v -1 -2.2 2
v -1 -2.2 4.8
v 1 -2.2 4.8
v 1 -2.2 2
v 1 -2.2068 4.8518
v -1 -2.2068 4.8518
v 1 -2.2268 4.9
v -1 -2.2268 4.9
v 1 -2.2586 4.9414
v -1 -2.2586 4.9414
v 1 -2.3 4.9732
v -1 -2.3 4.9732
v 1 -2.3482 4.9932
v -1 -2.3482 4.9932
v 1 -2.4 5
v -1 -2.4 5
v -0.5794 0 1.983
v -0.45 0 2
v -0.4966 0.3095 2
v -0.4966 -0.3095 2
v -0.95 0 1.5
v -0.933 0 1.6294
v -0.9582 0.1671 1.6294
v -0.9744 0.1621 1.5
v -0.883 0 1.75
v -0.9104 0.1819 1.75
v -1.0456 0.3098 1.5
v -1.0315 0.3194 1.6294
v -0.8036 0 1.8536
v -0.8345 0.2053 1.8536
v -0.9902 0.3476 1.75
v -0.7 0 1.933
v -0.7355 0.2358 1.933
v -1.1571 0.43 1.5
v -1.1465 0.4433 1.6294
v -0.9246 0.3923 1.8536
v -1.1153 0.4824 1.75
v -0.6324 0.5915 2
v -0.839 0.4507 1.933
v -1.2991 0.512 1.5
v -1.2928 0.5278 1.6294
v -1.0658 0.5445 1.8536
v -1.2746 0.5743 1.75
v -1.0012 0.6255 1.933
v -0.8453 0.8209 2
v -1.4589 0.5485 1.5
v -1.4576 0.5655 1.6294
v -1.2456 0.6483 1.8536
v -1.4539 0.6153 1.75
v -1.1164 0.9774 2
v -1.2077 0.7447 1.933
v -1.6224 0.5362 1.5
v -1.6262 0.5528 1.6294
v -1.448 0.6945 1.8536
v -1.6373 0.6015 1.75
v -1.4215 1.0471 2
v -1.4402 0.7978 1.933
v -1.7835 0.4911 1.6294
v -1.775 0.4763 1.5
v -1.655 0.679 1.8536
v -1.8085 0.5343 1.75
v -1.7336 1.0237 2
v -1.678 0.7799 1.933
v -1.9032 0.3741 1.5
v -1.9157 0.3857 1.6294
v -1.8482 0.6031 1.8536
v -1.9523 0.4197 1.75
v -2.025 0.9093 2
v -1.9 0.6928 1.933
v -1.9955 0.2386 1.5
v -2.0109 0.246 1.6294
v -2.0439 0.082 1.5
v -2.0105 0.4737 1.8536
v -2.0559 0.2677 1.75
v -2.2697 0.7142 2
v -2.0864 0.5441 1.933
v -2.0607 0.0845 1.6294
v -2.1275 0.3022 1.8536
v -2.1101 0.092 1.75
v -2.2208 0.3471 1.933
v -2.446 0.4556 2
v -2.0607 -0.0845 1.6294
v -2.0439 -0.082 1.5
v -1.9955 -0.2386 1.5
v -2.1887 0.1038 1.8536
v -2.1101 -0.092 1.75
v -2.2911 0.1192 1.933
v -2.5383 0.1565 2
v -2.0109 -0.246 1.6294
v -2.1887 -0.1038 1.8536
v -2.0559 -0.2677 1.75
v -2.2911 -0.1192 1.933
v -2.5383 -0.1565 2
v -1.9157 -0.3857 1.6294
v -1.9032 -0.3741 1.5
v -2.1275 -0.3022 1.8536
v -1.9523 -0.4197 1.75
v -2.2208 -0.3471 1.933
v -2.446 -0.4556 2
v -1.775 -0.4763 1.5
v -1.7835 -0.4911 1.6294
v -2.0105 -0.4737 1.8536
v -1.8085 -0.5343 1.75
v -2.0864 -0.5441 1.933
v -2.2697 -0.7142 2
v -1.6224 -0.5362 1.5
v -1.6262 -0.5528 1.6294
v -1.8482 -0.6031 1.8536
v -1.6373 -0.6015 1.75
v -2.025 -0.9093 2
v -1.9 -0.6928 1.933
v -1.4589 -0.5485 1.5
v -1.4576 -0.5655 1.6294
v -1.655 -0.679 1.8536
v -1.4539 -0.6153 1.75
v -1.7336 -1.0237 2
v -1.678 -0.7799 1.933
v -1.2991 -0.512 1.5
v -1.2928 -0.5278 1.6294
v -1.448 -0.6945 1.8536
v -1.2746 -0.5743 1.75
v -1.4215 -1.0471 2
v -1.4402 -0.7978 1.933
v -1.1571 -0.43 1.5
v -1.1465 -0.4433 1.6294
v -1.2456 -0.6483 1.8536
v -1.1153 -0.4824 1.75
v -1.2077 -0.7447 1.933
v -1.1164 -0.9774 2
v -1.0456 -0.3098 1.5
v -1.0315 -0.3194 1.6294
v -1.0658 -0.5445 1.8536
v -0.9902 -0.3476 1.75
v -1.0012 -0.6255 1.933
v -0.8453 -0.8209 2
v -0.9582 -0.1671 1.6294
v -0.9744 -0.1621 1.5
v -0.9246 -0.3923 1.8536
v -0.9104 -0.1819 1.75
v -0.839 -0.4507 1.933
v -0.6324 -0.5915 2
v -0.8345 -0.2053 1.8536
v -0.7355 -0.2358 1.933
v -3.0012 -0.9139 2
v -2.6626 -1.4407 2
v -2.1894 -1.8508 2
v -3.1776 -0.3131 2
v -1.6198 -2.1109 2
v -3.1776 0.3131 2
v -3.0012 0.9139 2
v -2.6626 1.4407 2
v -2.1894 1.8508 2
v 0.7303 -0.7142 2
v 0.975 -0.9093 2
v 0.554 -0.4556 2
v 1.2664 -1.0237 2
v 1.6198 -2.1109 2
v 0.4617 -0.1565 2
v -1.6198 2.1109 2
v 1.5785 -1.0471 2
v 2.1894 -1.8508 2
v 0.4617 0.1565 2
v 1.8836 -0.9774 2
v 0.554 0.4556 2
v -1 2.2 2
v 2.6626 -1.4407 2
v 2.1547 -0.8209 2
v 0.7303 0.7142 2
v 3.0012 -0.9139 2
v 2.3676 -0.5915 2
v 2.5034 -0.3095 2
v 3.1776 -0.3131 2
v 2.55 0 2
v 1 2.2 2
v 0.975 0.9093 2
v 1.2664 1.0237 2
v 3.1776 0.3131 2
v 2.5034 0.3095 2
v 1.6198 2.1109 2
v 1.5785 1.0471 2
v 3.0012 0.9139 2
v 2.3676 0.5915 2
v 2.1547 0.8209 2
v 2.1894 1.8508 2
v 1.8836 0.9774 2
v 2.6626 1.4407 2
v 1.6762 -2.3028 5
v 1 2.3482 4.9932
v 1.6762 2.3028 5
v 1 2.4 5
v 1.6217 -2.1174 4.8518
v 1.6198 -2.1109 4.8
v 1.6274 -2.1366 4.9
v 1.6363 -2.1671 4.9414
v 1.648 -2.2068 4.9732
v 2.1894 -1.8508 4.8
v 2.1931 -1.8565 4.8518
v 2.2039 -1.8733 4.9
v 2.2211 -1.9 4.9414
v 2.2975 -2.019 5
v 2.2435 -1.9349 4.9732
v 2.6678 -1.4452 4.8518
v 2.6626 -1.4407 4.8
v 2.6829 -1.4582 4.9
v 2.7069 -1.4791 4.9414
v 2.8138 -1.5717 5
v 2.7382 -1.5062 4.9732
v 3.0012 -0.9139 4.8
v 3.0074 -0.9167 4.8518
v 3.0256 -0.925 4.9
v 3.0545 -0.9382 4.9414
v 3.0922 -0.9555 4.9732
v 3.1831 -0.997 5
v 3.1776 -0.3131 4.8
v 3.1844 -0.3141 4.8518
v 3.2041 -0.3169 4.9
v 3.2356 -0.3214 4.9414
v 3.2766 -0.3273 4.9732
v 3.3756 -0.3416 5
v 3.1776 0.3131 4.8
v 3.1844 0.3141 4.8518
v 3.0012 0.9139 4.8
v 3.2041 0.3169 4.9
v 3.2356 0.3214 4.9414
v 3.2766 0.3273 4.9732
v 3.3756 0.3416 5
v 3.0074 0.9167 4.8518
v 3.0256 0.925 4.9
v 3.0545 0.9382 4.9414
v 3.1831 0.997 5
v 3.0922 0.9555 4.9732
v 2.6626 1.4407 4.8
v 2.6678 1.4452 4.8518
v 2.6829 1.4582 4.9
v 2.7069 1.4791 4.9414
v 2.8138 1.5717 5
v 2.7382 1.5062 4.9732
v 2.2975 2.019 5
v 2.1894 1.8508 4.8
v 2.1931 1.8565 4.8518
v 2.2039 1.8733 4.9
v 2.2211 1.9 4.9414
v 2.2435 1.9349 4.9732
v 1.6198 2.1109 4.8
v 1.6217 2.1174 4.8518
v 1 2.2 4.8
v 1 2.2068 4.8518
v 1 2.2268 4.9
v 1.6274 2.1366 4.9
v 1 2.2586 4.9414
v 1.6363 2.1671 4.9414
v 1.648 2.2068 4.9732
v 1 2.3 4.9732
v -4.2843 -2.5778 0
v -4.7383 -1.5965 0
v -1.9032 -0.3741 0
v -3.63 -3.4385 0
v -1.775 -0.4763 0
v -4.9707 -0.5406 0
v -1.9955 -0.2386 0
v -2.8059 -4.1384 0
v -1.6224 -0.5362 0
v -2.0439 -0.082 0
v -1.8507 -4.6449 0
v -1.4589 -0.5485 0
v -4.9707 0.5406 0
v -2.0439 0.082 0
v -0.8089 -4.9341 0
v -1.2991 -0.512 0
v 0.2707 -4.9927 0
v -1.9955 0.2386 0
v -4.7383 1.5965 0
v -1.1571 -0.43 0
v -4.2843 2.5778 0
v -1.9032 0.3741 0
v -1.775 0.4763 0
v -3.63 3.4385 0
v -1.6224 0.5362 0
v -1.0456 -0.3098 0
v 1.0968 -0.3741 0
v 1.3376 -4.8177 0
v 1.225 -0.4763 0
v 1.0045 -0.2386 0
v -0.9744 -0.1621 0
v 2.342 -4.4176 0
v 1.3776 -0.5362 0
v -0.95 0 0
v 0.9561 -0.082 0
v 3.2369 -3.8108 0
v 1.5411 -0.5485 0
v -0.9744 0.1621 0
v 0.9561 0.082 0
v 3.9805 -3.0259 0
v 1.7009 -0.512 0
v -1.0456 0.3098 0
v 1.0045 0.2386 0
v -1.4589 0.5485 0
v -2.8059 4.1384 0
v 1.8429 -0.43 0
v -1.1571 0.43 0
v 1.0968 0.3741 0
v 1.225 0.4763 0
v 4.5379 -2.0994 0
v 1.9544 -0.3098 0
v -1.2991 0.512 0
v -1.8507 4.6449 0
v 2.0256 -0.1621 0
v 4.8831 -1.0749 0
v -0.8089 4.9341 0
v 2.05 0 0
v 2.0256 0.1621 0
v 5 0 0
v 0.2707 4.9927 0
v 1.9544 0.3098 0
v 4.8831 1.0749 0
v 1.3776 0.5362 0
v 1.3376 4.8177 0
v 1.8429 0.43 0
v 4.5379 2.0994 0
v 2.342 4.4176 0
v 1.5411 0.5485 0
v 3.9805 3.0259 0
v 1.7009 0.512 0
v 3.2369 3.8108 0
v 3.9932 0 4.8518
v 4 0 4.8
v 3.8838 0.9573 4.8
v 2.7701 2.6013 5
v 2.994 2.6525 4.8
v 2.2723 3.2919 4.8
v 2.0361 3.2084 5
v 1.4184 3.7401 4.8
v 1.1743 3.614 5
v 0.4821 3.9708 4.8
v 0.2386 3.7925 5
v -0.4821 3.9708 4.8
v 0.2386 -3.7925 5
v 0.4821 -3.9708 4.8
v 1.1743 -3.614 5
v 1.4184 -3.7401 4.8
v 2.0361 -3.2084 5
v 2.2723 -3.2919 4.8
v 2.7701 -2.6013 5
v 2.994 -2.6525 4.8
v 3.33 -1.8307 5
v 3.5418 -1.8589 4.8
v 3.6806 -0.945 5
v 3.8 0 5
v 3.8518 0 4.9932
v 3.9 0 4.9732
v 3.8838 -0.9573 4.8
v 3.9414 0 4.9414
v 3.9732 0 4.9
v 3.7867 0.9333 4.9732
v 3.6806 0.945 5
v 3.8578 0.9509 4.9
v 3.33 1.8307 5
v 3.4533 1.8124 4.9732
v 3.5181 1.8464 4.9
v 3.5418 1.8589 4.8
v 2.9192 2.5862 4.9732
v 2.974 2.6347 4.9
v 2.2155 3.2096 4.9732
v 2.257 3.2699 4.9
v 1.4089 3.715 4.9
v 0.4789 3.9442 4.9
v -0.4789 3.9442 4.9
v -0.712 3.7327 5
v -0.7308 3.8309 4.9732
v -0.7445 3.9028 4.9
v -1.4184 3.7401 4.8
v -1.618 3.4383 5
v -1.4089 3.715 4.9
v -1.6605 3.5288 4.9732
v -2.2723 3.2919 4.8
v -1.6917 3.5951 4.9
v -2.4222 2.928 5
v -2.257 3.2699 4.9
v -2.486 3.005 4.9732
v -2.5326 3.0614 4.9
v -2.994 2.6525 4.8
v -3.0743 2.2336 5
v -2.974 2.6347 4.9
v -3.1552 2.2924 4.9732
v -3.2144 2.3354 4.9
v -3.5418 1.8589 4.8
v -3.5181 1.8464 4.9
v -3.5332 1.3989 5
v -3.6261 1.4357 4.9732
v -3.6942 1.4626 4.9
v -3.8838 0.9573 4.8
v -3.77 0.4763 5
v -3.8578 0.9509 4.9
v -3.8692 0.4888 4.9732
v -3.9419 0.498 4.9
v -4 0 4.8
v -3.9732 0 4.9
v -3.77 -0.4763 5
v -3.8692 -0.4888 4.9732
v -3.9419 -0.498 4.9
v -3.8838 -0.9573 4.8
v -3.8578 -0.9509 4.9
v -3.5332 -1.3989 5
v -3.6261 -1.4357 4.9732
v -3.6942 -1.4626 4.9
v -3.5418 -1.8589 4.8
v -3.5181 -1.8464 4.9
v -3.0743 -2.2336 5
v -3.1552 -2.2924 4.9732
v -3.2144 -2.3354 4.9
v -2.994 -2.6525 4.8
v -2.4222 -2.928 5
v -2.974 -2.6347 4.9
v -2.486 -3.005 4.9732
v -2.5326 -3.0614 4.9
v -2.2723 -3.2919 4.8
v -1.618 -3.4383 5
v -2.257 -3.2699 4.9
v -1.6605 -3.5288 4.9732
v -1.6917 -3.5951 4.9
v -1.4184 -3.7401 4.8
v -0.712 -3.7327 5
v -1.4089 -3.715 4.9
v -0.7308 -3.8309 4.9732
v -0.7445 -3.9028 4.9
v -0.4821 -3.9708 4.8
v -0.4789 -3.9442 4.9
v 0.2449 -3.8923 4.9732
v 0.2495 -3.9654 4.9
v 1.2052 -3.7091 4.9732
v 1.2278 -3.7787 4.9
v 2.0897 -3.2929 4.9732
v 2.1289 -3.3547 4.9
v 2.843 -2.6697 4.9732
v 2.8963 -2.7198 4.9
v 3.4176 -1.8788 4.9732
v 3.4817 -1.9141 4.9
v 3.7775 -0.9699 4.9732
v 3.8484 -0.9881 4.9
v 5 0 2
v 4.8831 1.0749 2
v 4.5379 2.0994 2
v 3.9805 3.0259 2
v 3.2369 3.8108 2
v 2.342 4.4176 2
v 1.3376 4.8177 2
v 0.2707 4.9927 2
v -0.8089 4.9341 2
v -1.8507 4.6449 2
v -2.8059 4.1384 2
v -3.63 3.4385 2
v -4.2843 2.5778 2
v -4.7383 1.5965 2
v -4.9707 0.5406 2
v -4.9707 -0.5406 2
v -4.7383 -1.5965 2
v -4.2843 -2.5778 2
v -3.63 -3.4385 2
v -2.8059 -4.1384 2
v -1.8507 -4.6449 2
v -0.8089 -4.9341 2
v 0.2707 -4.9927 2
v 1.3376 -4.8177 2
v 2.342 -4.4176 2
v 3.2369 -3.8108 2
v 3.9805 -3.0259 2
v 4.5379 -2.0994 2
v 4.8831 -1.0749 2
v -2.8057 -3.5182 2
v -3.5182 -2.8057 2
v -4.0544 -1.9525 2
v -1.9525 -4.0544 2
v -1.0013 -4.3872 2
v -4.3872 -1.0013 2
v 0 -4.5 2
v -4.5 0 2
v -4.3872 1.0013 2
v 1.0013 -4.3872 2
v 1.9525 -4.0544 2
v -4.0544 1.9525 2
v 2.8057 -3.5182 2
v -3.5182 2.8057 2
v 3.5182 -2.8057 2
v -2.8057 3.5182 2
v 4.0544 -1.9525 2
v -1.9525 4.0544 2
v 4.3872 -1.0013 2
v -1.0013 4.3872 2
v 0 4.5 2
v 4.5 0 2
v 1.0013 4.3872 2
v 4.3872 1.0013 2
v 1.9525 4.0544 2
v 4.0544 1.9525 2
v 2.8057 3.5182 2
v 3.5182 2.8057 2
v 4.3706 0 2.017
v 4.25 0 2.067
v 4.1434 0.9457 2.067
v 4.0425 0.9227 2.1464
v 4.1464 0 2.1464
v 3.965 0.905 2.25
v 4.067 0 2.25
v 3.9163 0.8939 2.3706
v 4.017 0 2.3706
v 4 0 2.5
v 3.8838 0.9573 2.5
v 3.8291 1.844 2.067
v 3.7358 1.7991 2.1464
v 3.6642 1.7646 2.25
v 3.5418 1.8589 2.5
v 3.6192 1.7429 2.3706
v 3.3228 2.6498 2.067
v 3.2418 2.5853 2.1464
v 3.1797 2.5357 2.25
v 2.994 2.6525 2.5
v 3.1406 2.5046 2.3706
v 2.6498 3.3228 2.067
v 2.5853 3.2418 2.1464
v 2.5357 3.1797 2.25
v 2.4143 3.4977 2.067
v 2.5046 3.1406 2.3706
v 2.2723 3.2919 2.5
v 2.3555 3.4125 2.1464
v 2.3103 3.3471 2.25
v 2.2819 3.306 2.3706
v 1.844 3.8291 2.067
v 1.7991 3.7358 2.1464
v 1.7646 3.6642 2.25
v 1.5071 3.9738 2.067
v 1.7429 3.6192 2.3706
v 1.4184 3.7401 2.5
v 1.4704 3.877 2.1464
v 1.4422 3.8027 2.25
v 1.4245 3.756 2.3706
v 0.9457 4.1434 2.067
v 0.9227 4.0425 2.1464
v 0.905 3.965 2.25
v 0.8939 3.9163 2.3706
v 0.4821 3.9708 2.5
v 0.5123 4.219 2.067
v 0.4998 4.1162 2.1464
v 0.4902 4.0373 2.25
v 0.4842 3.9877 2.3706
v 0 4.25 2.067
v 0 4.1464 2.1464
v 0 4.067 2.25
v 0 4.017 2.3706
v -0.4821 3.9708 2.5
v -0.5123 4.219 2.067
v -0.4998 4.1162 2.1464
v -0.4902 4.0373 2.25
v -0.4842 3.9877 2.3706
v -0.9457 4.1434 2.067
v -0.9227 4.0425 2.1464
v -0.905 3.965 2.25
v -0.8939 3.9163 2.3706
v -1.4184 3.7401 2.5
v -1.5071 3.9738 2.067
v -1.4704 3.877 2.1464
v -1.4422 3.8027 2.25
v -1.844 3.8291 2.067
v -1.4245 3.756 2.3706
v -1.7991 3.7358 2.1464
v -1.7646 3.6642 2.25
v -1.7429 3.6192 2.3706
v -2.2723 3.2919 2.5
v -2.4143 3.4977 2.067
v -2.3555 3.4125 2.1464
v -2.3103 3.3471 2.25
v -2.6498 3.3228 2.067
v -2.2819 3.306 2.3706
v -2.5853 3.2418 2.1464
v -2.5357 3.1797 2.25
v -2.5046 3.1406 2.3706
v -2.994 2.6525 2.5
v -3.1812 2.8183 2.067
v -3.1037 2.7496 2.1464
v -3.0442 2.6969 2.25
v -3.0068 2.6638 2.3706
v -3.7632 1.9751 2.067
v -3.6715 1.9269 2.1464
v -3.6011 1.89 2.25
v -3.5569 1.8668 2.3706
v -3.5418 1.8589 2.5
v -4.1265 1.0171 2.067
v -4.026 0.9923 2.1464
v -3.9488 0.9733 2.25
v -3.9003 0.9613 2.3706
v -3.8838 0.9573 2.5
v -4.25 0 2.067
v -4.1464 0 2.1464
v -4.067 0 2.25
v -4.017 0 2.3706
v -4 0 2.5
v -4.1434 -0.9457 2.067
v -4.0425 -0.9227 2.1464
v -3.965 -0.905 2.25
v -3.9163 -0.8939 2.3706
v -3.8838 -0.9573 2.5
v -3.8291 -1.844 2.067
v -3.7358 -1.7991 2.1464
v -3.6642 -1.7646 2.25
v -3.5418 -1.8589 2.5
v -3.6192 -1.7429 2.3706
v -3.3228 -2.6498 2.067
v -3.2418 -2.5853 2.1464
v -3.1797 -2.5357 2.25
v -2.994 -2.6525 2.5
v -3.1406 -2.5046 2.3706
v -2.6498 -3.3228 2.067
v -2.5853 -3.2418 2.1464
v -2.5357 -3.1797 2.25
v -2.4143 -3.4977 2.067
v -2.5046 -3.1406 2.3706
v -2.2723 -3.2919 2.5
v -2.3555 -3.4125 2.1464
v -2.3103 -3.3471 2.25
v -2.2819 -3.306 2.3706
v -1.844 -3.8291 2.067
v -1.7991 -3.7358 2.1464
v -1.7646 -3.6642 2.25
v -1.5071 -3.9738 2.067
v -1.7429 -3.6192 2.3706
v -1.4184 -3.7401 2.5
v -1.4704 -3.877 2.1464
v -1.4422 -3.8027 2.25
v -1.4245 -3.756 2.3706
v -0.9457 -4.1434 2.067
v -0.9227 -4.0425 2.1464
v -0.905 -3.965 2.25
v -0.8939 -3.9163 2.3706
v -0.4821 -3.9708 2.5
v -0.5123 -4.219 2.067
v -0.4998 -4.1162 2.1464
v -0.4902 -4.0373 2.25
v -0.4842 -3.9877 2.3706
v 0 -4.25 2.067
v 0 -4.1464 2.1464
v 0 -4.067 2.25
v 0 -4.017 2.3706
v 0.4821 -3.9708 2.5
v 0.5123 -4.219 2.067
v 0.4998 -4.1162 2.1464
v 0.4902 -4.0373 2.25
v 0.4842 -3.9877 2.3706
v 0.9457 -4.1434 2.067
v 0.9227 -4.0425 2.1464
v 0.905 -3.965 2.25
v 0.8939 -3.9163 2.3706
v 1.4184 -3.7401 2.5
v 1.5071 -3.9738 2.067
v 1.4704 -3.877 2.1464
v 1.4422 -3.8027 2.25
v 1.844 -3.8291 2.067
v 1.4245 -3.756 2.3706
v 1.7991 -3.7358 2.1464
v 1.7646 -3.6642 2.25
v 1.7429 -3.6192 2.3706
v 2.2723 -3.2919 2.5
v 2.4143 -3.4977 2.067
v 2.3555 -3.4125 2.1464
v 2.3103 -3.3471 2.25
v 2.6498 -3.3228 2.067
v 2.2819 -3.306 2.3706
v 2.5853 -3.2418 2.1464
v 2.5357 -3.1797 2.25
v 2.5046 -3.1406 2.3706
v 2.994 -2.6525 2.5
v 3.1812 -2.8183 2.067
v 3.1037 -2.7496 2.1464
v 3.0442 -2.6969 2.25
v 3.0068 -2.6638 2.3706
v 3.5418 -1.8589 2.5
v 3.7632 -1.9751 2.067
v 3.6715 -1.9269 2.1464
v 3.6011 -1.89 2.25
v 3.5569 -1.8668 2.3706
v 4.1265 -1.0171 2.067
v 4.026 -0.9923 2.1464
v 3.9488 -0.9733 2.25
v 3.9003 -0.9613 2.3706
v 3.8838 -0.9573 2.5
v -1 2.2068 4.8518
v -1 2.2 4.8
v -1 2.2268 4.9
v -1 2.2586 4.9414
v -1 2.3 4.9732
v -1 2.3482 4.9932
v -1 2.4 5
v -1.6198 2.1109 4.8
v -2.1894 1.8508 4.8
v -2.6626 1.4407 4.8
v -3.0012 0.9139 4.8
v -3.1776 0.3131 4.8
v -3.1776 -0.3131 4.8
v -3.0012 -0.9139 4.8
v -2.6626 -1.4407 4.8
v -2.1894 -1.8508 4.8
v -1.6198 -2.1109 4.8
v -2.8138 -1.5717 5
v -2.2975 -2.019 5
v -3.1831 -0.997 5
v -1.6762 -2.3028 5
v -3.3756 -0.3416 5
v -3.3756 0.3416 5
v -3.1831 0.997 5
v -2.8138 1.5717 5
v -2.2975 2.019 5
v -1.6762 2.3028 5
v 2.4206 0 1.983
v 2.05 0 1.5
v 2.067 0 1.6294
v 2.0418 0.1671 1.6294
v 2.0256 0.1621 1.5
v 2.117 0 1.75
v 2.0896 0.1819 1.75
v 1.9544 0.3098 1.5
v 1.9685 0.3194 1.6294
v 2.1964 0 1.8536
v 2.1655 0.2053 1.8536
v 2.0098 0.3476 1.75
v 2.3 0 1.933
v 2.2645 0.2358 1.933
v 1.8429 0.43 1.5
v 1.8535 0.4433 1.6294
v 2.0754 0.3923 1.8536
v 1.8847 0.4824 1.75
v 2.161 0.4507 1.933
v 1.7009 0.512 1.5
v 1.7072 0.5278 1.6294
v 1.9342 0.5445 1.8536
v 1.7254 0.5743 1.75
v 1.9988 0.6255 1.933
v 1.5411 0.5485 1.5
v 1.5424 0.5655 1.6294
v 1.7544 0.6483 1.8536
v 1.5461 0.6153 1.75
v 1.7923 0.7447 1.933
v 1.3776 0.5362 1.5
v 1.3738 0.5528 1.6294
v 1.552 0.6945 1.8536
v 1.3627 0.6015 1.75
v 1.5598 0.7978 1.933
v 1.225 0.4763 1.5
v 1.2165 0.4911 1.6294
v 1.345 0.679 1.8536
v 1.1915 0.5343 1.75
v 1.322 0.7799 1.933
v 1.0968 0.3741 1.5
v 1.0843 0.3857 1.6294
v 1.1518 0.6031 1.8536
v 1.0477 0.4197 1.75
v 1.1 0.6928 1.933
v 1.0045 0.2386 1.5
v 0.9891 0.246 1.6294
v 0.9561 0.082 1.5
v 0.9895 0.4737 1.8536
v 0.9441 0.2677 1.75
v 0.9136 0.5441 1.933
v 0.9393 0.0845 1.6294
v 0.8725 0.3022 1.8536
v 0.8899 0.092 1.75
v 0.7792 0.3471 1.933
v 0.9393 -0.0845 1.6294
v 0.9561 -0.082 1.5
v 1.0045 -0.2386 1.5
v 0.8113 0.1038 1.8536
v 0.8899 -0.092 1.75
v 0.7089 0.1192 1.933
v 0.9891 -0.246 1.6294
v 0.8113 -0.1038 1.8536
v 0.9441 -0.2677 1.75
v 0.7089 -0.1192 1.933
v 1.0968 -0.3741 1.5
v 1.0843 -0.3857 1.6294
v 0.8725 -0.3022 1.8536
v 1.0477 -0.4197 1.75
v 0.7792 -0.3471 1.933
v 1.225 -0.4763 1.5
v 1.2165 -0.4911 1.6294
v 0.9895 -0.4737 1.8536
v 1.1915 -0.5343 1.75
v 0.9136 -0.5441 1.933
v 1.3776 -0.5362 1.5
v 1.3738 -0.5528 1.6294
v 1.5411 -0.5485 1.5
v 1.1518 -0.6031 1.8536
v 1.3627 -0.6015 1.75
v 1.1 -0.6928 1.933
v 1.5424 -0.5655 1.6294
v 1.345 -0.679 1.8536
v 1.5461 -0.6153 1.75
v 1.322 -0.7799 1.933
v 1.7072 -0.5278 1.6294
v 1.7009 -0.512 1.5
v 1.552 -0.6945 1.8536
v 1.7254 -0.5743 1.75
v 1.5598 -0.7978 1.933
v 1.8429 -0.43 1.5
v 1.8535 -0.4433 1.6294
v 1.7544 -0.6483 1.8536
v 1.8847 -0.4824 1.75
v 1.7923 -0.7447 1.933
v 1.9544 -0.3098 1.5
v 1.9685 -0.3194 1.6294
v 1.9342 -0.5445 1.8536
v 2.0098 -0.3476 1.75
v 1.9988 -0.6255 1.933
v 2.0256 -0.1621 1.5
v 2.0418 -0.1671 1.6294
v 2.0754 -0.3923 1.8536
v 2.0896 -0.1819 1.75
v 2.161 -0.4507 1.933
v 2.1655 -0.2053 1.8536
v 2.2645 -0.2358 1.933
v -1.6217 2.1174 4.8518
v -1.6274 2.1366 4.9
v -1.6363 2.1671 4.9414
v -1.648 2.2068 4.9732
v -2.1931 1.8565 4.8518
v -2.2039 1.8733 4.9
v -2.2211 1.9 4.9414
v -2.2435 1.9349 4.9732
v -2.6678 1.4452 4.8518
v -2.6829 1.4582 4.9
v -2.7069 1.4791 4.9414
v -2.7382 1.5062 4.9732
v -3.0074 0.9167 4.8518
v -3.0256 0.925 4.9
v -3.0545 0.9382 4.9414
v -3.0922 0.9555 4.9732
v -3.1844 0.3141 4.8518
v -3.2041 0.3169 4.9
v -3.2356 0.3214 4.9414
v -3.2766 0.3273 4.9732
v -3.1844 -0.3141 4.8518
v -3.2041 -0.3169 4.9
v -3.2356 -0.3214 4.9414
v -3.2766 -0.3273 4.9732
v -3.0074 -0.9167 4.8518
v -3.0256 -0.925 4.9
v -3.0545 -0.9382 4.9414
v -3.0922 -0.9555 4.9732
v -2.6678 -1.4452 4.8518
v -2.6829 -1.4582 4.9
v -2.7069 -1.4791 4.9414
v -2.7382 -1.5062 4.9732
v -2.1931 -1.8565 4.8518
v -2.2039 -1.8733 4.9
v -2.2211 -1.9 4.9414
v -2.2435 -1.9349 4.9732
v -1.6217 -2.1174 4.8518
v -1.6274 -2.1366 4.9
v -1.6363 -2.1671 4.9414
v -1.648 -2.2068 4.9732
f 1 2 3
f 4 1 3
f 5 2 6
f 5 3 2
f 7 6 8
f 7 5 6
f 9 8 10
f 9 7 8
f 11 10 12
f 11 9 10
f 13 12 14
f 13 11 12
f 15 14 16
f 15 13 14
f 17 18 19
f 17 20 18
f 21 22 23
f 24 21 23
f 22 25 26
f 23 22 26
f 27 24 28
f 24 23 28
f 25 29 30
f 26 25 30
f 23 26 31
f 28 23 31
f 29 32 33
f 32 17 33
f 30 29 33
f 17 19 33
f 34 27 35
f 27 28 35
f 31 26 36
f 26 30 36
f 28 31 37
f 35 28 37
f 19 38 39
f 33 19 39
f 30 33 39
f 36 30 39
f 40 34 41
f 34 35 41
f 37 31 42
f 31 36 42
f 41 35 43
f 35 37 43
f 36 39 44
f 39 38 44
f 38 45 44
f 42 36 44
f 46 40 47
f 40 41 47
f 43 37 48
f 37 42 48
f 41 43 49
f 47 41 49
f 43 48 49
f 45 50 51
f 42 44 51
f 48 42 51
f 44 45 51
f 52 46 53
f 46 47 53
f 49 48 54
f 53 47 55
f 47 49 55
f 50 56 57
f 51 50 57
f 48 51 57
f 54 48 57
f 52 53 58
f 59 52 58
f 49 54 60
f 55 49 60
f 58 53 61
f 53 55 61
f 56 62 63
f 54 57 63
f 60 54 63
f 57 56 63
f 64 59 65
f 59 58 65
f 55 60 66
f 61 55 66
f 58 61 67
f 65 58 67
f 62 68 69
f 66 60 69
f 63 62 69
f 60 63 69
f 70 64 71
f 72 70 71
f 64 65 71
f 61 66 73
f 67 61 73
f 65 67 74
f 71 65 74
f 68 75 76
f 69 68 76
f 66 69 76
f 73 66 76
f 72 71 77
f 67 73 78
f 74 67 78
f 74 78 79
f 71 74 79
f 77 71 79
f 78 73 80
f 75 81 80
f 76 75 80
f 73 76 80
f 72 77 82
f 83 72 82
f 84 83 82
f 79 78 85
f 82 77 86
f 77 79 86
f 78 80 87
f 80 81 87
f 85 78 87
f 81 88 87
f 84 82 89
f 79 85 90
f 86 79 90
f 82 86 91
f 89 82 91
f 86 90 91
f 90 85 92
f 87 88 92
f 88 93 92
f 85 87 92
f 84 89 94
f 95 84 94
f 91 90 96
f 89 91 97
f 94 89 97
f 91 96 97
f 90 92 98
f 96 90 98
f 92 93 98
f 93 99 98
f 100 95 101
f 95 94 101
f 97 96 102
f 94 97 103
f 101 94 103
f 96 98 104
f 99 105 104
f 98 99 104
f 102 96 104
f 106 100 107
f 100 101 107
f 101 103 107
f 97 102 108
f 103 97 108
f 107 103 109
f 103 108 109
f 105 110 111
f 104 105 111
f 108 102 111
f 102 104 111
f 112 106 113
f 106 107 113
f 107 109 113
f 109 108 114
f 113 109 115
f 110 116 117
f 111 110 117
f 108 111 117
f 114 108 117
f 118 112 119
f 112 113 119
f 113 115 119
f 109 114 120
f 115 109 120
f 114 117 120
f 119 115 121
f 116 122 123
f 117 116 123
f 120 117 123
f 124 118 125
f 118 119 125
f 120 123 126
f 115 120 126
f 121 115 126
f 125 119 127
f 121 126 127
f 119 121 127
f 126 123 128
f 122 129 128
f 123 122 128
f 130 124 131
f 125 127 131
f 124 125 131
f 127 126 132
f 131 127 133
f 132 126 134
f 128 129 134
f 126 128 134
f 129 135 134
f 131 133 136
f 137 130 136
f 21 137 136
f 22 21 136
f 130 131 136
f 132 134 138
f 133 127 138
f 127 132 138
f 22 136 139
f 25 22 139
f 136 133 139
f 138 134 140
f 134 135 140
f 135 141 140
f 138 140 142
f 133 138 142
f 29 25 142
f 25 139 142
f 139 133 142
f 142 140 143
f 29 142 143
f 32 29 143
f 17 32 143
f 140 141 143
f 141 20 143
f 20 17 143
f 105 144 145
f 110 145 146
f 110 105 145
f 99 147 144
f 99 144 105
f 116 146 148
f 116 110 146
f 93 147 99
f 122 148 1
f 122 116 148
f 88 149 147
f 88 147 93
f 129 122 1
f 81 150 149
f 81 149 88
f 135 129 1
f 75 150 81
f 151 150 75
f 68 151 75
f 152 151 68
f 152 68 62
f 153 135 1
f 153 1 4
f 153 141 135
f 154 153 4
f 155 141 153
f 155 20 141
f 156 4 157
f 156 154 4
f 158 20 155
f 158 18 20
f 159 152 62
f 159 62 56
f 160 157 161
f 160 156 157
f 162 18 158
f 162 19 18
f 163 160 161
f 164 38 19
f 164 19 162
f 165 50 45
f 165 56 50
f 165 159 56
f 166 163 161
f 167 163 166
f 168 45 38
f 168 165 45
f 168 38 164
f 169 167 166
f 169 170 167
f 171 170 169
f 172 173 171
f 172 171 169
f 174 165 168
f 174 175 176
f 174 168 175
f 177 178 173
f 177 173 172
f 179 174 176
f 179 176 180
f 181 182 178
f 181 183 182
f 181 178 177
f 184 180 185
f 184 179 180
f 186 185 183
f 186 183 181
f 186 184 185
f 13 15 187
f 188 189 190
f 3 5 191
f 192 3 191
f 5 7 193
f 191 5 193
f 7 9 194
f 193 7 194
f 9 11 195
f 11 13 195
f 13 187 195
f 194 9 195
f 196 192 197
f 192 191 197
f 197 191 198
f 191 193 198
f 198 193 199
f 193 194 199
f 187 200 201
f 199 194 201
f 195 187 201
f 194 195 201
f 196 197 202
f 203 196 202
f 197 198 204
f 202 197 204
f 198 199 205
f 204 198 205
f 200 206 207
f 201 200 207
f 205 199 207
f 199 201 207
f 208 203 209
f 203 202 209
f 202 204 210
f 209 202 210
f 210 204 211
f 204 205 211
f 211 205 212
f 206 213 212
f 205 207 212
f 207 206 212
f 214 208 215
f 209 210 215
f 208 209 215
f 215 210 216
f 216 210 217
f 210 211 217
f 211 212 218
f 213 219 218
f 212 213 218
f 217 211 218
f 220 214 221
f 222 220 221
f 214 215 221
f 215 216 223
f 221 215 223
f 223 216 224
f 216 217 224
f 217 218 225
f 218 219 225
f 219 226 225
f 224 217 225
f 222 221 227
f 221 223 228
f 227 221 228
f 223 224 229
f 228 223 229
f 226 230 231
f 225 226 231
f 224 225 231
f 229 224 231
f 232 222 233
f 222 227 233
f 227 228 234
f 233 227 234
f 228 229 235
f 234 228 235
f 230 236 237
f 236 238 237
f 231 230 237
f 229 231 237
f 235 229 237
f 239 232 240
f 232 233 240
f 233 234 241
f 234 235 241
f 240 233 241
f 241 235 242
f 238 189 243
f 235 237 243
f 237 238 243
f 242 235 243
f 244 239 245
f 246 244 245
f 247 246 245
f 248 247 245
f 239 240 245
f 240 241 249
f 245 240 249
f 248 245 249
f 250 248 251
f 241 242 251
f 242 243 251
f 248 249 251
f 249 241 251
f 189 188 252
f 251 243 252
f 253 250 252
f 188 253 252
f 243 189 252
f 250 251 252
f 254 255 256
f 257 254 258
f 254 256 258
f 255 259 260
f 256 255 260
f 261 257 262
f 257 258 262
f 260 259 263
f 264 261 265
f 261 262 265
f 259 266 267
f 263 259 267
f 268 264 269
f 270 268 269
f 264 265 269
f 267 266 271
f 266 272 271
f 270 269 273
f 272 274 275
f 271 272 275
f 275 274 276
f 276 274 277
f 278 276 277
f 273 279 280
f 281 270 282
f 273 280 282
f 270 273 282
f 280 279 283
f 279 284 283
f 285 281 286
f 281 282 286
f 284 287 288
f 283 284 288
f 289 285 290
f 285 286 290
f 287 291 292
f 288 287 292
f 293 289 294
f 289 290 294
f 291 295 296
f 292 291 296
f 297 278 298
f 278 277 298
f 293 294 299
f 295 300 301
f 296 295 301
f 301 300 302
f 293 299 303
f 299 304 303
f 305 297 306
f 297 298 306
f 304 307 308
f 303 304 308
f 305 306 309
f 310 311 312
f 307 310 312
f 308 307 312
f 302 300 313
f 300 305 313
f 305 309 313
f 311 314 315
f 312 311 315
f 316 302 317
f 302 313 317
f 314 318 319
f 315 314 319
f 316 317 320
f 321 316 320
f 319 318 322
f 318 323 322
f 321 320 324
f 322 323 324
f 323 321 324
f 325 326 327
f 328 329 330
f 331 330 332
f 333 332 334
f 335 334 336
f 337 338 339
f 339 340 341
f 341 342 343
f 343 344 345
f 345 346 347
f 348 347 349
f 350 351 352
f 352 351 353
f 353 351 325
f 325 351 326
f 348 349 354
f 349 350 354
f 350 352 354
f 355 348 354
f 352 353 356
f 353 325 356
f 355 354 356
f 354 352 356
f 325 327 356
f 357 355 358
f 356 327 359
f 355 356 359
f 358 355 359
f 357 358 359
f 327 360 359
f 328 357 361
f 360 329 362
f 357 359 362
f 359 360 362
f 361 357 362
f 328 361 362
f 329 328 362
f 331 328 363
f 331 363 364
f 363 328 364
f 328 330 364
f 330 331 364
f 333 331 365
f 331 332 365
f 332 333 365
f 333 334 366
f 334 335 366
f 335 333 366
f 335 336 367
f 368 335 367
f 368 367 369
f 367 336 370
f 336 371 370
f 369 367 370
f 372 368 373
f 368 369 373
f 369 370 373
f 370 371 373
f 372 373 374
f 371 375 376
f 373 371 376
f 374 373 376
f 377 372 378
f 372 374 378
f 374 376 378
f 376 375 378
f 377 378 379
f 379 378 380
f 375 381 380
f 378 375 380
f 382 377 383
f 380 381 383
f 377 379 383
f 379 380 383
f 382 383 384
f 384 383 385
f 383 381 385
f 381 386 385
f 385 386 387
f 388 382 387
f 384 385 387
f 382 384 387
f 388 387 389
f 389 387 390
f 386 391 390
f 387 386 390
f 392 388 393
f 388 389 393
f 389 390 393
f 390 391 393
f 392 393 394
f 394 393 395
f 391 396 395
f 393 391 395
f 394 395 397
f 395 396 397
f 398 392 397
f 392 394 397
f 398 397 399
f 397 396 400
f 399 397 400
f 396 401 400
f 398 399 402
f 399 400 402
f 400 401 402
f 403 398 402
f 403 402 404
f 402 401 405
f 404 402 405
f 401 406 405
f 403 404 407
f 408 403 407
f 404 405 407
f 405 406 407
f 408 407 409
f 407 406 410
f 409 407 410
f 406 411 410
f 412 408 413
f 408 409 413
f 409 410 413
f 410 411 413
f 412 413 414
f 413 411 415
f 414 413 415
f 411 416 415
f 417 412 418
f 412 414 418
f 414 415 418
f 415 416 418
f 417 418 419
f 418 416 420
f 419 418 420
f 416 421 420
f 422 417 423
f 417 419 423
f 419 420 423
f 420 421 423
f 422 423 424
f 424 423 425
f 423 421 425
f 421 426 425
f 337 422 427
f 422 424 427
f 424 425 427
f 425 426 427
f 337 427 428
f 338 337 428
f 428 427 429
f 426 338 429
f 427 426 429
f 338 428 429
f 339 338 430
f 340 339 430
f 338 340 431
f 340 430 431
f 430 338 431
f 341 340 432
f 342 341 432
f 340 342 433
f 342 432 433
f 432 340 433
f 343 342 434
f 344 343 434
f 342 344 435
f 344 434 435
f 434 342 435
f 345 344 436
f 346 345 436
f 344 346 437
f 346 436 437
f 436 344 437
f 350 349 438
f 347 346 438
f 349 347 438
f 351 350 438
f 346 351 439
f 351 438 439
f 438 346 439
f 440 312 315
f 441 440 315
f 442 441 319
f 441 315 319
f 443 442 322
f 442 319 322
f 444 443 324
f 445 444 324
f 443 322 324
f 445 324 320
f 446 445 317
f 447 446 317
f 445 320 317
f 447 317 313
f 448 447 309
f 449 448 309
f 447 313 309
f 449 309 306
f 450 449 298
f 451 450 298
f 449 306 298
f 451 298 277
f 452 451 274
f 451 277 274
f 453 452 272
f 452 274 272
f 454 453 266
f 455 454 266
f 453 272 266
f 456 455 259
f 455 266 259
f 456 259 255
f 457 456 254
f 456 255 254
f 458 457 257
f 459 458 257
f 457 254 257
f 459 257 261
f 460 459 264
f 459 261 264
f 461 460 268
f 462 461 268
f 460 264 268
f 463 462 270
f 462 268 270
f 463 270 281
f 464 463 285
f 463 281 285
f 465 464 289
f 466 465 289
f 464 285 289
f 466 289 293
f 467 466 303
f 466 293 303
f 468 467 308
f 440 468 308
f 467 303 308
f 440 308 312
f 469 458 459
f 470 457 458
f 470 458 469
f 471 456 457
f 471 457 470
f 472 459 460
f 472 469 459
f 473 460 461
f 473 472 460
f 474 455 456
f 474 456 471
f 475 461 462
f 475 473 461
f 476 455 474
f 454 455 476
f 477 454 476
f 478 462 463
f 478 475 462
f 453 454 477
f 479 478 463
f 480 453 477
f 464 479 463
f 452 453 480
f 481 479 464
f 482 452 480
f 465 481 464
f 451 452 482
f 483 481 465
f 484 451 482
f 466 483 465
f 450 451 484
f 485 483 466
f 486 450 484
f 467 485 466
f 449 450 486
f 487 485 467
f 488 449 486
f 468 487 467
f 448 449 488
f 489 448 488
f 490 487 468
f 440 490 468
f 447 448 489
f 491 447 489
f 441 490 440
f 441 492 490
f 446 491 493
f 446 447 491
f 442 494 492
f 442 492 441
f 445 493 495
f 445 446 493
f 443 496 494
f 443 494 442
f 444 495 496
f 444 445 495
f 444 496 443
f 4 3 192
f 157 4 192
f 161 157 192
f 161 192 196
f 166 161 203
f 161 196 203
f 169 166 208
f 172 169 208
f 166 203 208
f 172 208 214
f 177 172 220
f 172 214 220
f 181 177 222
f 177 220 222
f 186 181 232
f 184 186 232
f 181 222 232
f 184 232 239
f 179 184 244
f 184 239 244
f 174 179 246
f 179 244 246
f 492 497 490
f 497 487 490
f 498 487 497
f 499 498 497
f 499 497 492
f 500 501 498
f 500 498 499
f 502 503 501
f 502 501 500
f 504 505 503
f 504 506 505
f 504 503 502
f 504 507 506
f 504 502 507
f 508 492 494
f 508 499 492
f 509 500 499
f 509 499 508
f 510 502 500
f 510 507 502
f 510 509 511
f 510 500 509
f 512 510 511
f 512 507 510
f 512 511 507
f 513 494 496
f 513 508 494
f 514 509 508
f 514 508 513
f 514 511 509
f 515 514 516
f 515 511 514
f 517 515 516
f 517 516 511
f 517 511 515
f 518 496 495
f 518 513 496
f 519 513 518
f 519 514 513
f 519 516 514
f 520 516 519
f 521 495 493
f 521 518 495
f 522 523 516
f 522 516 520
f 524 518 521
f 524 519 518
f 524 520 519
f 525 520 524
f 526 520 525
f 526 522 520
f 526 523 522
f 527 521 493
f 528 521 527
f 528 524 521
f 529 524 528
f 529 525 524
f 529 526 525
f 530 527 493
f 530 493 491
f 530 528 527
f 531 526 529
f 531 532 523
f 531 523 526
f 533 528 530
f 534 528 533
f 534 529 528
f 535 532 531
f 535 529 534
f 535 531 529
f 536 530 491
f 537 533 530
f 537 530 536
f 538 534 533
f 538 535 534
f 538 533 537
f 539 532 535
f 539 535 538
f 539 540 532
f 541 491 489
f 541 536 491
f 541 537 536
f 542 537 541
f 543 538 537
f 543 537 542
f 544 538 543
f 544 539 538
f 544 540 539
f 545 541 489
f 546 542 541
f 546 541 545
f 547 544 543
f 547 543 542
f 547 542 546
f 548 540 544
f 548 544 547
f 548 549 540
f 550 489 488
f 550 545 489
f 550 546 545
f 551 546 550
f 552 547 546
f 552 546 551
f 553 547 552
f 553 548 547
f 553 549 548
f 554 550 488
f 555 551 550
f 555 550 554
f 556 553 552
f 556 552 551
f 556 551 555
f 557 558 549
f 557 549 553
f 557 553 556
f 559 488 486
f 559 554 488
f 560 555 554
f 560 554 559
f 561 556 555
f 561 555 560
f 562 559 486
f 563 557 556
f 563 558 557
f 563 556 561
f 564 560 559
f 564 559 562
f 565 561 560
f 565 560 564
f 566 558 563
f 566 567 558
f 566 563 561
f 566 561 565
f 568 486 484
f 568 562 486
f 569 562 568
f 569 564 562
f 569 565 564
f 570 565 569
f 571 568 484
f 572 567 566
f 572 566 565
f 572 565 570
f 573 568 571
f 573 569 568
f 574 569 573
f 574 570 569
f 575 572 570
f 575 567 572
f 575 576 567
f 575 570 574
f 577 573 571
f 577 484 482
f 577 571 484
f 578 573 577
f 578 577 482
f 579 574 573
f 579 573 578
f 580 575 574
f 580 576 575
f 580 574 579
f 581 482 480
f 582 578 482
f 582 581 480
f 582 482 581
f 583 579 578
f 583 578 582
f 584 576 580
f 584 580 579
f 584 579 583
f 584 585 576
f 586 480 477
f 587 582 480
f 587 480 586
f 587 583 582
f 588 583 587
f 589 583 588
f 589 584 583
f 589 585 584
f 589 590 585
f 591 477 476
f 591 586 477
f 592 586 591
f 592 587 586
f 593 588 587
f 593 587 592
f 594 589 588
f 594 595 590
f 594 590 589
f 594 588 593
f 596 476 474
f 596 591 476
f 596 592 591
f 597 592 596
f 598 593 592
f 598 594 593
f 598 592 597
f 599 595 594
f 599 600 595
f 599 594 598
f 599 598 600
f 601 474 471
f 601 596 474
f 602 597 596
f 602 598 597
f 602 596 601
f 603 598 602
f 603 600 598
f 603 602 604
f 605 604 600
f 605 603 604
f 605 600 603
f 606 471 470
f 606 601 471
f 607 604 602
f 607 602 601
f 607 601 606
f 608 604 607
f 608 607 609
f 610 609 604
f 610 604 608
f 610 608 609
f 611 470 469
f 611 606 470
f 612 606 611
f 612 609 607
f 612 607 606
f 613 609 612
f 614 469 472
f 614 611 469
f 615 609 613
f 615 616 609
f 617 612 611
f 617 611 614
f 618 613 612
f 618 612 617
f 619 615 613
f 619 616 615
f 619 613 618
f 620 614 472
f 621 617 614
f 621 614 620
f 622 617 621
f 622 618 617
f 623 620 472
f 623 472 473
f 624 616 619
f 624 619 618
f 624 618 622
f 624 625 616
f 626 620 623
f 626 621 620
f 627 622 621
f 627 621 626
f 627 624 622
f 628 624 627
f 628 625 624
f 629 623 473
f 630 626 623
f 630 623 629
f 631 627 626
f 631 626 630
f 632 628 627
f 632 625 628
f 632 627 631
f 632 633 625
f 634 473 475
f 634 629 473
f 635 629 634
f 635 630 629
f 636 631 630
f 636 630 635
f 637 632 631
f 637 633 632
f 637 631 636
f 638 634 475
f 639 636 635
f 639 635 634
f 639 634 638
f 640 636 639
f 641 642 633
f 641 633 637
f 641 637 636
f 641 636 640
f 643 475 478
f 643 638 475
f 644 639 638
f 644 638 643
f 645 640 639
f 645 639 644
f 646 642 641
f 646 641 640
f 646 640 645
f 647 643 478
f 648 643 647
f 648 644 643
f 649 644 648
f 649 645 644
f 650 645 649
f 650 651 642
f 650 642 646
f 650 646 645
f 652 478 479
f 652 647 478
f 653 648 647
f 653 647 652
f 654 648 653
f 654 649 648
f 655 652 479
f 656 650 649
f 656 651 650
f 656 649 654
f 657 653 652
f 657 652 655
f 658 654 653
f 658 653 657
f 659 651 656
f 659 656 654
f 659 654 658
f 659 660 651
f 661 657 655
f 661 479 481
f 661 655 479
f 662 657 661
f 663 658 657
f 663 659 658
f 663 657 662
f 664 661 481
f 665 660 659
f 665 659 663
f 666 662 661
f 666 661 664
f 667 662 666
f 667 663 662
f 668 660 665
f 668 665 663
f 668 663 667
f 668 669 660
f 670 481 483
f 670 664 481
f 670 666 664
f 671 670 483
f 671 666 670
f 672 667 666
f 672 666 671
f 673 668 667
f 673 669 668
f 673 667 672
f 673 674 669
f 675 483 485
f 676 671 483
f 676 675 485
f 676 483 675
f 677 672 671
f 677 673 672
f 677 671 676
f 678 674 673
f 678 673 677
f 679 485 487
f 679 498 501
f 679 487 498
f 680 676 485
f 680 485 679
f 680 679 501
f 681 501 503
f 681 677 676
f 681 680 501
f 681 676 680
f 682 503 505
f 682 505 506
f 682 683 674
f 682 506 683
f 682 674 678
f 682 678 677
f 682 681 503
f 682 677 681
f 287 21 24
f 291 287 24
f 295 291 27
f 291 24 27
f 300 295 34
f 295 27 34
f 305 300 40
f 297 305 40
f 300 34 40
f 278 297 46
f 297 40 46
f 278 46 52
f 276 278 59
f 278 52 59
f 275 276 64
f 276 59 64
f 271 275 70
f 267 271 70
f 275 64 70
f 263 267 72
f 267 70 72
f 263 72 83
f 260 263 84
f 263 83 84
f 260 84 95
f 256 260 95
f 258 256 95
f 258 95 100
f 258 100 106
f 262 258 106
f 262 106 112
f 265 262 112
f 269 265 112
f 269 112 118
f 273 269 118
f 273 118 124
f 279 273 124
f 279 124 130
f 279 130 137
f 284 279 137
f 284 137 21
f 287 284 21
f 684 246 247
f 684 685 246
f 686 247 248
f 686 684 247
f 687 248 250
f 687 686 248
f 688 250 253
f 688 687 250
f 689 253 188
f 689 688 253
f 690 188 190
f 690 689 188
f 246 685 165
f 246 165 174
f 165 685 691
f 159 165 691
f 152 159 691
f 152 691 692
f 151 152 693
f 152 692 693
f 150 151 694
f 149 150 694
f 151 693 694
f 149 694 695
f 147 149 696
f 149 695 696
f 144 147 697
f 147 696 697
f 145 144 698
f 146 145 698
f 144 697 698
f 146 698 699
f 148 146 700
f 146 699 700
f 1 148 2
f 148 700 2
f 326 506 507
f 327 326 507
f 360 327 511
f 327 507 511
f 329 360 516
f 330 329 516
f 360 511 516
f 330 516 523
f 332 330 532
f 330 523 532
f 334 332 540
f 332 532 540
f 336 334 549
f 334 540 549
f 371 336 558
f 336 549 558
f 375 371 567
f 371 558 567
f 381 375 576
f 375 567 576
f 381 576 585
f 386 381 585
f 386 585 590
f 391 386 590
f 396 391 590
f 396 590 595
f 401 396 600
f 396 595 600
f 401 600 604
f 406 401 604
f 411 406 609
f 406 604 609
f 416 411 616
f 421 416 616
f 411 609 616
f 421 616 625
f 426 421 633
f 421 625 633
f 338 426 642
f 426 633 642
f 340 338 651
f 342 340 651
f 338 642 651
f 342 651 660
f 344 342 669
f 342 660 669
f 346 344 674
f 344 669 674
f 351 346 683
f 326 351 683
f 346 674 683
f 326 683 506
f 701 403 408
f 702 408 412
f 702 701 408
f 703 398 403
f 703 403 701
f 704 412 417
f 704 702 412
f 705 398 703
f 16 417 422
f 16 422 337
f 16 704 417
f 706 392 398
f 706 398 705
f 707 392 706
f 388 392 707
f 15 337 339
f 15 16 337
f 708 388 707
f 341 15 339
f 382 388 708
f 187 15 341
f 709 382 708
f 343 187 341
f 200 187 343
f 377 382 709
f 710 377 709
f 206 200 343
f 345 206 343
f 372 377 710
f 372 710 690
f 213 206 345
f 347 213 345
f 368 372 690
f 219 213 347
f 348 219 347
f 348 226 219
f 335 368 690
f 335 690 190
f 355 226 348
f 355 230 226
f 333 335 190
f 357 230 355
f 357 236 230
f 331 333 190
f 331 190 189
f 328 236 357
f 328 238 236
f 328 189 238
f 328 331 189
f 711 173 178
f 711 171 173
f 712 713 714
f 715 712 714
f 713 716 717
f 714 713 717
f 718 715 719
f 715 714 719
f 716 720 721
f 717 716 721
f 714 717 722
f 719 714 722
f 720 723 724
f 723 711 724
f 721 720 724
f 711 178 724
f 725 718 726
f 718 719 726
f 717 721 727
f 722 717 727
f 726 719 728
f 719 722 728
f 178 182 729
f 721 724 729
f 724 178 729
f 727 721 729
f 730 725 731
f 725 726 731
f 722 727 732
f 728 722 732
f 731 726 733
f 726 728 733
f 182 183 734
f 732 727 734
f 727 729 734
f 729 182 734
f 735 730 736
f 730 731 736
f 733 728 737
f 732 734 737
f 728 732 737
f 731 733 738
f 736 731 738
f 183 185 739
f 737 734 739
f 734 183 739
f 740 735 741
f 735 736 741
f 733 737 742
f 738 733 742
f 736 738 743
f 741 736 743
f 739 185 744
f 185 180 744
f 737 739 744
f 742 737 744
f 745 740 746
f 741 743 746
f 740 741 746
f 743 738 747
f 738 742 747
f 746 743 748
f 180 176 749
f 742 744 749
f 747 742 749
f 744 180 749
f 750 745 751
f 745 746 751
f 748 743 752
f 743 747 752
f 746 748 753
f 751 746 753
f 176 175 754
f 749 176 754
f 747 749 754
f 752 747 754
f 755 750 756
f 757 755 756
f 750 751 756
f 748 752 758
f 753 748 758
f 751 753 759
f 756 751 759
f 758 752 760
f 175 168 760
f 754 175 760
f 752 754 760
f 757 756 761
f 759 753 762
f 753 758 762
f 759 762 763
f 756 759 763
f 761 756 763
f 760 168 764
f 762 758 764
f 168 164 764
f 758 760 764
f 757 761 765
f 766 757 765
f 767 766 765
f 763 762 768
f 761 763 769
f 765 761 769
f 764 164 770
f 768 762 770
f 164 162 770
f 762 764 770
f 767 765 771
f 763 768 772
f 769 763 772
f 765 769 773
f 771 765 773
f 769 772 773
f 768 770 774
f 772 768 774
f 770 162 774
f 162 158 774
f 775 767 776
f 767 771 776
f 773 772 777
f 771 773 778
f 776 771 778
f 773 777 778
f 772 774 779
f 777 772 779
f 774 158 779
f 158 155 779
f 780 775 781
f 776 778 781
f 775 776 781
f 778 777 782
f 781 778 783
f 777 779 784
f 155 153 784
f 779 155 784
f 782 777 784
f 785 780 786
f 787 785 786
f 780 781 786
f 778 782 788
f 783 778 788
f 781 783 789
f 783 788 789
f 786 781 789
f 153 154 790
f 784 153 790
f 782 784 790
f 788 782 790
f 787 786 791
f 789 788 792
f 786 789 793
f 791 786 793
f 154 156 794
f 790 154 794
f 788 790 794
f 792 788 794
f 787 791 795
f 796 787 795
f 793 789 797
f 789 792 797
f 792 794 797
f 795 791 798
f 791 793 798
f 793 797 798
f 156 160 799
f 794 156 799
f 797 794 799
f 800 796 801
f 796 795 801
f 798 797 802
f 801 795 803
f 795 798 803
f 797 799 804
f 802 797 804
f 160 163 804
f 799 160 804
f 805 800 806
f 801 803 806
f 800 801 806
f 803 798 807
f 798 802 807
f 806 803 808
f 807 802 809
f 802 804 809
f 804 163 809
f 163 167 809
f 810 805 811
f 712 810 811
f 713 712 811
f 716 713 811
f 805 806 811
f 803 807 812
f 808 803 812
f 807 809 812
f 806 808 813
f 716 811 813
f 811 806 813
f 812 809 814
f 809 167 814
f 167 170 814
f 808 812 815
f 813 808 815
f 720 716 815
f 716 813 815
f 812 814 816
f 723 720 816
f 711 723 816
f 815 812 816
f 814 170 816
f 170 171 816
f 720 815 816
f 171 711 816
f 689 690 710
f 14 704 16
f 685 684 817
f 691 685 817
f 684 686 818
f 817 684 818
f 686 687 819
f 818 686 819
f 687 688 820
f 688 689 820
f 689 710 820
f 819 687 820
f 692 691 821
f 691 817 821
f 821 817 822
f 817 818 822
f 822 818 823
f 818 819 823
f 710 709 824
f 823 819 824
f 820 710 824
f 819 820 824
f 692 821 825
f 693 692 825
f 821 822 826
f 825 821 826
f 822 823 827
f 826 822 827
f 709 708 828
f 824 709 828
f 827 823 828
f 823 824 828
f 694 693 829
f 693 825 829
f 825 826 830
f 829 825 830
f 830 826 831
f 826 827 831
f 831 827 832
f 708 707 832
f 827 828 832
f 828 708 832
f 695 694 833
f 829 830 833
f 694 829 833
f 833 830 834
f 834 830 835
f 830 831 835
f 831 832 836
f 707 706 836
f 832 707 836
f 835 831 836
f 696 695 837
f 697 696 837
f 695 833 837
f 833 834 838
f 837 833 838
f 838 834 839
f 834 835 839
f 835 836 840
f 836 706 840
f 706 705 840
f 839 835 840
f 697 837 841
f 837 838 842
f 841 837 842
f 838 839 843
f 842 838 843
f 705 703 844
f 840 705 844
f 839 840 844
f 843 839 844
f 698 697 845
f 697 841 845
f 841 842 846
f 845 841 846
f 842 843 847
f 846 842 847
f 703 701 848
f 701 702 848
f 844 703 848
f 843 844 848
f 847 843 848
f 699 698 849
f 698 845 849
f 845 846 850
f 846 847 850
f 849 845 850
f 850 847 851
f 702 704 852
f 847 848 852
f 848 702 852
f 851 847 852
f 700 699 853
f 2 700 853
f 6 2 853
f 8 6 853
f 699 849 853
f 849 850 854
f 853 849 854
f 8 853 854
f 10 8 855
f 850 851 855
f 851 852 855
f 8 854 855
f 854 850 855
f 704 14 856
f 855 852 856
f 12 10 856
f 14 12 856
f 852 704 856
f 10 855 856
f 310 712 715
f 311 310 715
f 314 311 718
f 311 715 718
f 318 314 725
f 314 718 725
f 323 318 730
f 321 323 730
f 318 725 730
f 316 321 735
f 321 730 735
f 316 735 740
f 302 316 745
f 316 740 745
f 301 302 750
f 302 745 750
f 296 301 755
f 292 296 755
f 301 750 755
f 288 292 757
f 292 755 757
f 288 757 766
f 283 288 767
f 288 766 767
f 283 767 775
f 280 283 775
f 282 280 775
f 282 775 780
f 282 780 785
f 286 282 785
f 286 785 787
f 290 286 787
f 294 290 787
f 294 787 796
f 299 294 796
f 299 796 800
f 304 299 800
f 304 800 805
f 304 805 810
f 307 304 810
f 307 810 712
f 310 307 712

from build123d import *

# Parameters (mm, degrees)
SKETCH_R        = 5
PAD_DEPTH       = 2
SKETCH001_R     = 4
PAD001_DEPTH    = 3
POCKET_DEPTH    = 3
SKETCH003_R     = 0.55
POCKET001_DEPTH = 5.001
FILLET_R        = 0.5
FILLET001_R     = 0.5
FILLET002_R     = 0.2


with BuildPart() as part:
    # Sketch → Pad (new body)
    with BuildSketch(Plane.XY):
        Circle(SKETCH_R)
    extrude(amount=PAD_DEPTH)

    # Sketch001 (on Face3 of Pad) → Pad001 (join)
    with BuildSketch(Plane.XY.offset(2)):
        Circle(SKETCH001_R)
    extrude(amount=PAD001_DEPTH)

    # Sketch002 (on Face5 of Pad001) → Pocket (cut)
    with BuildSketch(Plane.XY.offset(5)):
        with BuildLine():
            ThreePointArc((-1, 2.2), (-3.2, 0), (-1, -2.2))
            Line((-1, -2.2), (1, -2.2))
            ThreePointArc((1, -2.2), (3.2, 0), (1, 2.2))
            Line((-1, 2.2), (1, 2.2))
        make_face()
    extrude(amount=-POCKET_DEPTH, mode=Mode.SUBTRACT)

    # Sketch003 (on Face5 of Pocket) → Pocket001 (cut, through all)
    with BuildSketch(Plane.XY.offset(5)):
        with Locations((-1.5, 0)):
            Circle(SKETCH003_R)
        with Locations((1.5, 0)):
            Circle(SKETCH003_R)
    extrude(amount=-POCKET001_DEPTH, mode=Mode.SUBTRACT)

    # Fillet
    fillet_edges = [part.edges().sort_by_distance(p)[0] for p in [
        (-4, 0, 2),
    ]]
    fillet(fillet_edges, radius=FILLET_R)

    # Fillet001
    fillet001_edges = [part.edges().sort_by_distance(p)[0] for p in [
        (-2.05, 0, 2),
        (0.95, 0, 2),
    ]]
    fillet(fillet001_edges, radius=FILLET001_R)

    # Fillet002
    fillet002_edges = [part.edges().sort_by_distance(p)[0] for p in [
        (-4, 0, 5),
        (-3.2, 0, 5),
        (0, -2.2, 5),
        (3.2, 0, 5),
        (0, 2.2, 5),
    ]]
    fillet(fillet002_edges, radius=FILLET002_R)


solid = part.part
